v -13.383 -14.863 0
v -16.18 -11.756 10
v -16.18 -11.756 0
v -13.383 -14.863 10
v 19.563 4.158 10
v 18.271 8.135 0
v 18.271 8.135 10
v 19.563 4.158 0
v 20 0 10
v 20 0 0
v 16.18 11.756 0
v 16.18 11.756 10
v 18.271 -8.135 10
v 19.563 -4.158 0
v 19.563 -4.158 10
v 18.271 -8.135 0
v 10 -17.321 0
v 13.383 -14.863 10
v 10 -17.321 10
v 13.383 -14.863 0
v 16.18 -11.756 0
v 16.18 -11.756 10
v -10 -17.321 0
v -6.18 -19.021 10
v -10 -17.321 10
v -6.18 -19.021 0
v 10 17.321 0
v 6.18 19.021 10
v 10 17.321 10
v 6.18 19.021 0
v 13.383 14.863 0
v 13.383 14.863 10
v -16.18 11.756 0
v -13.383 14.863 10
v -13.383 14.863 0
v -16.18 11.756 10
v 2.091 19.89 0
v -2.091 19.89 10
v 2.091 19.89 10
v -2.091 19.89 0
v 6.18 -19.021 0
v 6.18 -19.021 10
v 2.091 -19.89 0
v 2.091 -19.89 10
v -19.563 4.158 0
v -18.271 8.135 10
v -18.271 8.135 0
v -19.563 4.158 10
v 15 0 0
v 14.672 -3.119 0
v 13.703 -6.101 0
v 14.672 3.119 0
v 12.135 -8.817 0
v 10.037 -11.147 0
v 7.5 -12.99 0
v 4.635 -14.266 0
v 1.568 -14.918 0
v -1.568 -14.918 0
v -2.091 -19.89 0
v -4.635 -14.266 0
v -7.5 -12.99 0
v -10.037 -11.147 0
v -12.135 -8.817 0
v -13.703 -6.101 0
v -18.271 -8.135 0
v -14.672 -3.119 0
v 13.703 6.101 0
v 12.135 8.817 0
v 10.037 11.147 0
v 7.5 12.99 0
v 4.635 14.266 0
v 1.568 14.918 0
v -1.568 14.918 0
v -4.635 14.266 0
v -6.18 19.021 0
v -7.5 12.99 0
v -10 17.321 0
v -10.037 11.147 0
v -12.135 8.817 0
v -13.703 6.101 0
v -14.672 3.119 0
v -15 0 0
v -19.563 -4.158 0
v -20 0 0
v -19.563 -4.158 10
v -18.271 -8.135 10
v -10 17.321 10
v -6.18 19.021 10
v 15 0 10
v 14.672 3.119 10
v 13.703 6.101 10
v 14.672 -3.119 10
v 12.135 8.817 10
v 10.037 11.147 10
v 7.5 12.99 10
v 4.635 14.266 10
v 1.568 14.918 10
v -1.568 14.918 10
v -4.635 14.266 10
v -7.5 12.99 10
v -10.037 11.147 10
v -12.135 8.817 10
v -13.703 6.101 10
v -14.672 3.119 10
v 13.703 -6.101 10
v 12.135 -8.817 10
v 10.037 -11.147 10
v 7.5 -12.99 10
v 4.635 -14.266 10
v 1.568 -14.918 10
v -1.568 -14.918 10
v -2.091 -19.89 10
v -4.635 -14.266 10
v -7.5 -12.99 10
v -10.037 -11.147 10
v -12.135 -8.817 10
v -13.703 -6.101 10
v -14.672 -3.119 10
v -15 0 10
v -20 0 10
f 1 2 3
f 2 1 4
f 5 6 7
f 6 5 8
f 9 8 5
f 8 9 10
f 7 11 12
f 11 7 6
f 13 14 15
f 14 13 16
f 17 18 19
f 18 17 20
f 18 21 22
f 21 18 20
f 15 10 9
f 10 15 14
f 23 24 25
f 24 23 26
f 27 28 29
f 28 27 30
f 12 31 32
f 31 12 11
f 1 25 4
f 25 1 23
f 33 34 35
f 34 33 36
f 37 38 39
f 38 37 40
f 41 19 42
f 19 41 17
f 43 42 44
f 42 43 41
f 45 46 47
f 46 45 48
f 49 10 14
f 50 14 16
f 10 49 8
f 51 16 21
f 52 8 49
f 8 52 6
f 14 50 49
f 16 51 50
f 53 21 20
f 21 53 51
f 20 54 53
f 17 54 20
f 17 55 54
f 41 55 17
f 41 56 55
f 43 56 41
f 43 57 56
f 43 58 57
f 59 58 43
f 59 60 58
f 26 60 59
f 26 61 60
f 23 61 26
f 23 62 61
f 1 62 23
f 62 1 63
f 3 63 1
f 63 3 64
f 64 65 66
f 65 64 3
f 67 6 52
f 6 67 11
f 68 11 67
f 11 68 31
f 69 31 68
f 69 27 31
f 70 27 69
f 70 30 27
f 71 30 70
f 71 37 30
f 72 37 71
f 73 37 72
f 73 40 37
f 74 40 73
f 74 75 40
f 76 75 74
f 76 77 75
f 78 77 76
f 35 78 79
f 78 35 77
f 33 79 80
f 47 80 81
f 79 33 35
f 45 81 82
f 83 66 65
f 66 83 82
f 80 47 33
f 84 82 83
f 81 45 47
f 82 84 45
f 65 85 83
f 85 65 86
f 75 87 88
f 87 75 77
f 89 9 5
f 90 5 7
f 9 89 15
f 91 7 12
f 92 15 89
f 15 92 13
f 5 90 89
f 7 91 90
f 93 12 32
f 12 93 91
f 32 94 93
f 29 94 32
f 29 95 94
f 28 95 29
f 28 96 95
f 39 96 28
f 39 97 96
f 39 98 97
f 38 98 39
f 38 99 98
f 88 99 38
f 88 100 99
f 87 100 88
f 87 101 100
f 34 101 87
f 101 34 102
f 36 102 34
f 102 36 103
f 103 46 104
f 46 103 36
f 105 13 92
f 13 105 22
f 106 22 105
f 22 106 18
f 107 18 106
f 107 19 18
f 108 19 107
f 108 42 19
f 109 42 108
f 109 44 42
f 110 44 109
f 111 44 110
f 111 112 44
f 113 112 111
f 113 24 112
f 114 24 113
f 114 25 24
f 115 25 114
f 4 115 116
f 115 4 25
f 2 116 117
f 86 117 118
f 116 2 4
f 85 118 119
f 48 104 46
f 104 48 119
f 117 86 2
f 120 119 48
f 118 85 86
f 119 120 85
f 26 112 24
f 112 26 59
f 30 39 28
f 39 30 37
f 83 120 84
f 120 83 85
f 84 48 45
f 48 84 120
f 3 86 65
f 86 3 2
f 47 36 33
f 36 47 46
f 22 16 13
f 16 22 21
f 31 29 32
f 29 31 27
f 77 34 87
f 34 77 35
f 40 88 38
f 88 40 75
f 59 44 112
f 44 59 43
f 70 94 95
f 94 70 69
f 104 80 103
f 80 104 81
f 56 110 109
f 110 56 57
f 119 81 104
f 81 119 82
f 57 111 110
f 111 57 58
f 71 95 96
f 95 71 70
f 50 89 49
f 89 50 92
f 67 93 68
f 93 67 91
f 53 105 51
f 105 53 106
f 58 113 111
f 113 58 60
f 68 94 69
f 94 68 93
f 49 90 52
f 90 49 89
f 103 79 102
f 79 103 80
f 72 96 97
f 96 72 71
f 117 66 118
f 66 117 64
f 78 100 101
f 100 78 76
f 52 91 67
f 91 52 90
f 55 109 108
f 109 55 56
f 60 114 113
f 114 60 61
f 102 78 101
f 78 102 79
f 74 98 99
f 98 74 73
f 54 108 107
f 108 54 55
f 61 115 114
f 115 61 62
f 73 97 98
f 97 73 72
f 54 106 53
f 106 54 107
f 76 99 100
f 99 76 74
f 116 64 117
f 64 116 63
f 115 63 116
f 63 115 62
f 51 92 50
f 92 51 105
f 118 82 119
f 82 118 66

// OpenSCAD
// Difference removes parts of a shape. 
// 1. Add a second translated ring that is touching the first one. 
// 2. (Harder!) Make the Olympic rings. 



difference(){
cylinder(r=20, h = 10);

cylinder(r=15, h = 10);
}
